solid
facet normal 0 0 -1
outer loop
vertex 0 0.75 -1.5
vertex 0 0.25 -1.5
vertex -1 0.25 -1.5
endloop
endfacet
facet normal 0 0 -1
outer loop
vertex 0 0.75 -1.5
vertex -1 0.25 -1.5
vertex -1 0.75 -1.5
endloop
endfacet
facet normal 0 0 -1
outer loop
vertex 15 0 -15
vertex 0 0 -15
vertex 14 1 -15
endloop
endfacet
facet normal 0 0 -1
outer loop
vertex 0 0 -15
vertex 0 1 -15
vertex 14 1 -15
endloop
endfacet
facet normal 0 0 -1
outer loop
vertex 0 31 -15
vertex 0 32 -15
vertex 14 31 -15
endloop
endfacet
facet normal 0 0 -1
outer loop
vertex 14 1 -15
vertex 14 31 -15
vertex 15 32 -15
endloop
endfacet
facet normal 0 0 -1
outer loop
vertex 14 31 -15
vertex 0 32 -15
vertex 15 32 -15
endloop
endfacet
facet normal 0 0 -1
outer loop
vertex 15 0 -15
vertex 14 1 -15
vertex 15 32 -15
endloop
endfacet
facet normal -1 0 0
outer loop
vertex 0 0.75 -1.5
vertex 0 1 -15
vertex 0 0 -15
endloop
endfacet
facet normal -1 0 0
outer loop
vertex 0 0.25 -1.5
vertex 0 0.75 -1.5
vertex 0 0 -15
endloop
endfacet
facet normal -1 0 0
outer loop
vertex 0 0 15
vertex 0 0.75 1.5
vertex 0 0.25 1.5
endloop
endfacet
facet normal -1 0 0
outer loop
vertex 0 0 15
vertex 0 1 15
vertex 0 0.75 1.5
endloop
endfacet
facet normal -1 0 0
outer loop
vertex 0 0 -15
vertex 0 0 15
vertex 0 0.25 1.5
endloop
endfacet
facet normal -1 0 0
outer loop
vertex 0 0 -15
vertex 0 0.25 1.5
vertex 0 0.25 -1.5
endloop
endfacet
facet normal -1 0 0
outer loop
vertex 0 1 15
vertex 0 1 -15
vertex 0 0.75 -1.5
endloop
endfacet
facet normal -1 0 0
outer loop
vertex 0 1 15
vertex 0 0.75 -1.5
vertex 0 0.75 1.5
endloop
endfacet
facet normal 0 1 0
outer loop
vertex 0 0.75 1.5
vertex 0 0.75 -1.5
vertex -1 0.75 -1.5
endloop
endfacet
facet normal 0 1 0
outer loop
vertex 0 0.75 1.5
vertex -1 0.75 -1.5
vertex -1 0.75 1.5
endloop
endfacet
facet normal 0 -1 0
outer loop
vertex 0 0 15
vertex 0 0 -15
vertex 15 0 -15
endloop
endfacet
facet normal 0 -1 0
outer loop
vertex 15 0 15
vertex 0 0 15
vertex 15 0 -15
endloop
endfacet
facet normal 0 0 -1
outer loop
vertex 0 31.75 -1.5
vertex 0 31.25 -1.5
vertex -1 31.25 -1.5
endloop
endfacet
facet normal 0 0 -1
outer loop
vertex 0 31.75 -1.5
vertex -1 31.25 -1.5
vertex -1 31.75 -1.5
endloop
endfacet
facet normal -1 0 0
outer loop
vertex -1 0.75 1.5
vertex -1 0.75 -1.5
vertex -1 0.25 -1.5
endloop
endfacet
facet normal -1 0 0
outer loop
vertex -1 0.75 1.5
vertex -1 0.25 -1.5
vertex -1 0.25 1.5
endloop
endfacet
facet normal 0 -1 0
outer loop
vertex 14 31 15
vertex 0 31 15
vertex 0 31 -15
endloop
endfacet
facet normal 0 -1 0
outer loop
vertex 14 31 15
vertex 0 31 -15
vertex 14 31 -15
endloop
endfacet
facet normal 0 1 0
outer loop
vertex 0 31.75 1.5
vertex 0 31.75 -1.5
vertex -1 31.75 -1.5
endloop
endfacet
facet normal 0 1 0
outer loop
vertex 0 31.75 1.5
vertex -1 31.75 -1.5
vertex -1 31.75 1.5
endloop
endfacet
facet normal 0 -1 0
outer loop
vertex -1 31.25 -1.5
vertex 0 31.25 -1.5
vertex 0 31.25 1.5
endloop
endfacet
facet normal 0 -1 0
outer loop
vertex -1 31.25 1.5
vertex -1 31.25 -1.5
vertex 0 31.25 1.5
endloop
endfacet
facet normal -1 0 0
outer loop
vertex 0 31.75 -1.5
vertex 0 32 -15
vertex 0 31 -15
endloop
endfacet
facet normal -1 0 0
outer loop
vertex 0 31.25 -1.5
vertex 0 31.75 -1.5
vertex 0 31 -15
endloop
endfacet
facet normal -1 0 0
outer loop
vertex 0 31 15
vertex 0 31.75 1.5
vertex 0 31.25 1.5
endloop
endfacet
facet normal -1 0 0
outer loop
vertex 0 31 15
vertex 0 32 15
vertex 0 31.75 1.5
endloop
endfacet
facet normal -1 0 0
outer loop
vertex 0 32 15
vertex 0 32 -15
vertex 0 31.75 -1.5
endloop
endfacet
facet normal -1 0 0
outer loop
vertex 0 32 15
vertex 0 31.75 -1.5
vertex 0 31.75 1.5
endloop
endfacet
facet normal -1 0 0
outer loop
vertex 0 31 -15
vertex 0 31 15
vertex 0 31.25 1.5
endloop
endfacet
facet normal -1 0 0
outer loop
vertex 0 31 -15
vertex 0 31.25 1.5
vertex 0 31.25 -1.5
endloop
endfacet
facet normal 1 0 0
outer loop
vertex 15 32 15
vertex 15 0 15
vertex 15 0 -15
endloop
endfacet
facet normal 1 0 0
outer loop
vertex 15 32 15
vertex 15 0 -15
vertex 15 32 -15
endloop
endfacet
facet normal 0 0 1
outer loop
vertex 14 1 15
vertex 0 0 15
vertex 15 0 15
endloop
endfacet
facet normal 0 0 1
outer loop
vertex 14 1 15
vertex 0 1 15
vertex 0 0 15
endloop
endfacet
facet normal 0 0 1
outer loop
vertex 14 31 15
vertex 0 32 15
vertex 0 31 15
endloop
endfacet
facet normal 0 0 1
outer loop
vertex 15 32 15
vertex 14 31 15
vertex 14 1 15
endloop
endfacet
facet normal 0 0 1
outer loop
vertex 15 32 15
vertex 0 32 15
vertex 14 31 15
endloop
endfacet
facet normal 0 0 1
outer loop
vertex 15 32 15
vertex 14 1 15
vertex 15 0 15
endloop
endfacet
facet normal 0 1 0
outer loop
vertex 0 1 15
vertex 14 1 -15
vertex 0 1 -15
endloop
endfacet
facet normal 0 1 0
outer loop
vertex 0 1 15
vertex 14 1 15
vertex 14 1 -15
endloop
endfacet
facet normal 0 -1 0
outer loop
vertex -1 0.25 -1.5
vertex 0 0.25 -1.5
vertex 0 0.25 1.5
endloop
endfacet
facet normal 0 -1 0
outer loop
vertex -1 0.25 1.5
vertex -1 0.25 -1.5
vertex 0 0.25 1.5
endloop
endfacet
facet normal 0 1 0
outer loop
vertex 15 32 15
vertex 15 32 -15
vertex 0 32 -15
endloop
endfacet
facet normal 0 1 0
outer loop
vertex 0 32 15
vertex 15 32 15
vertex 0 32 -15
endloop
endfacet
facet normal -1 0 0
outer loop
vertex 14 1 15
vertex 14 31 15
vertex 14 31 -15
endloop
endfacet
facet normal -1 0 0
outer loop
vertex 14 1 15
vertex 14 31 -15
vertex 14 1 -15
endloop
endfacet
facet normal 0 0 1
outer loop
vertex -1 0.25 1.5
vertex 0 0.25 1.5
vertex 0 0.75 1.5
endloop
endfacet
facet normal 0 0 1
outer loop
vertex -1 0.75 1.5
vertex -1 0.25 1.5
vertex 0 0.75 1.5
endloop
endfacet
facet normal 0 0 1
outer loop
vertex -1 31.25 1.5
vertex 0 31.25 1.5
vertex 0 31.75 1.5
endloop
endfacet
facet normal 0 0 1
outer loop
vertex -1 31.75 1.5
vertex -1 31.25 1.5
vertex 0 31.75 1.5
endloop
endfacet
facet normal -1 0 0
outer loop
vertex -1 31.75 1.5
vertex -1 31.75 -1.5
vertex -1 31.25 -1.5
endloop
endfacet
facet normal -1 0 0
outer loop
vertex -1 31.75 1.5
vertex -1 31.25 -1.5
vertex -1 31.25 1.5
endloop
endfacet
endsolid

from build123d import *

# Parameters (mm, degrees)
BOSS_EXTRUDE1_DEPTH = 15
SKETCH2_W           = 3
SKETCH2_H           = 0.5
BOSS_EXTRUDE2_DEPTH = 1
SKETCH3_W           = 3
SKETCH3_H           = 0.5
BOSS_EXTRUDE3_DEPTH = 1


with BuildPart() as part:
    # Sketch1 → Boss-Extrude1 (new body, symmetric)
    with BuildSketch(Plane.XY):
        Polygon((0, 0), (15, 0), (15, 32), (0, 32), (0, 31), (14, 31), (14, 1), (0, 1), align=None)
    extrude(amount=BOSS_EXTRUDE1_DEPTH, both=True)

    # Sketch2 → Boss-Extrude2 (add)
    with BuildSketch(Plane.ZY):
        with Locations((0, 31.5)):
            Rectangle(SKETCH2_W, SKETCH2_H)
    extrude(amount=BOSS_EXTRUDE2_DEPTH)

    # Sketch3 → Boss-Extrude3 (add)
    with BuildSketch(Plane.ZY):
        with Locations((0, 0.5)):
            Rectangle(SKETCH3_W, SKETCH3_H)
    extrude(amount=BOSS_EXTRUDE3_DEPTH)


solid = part.part
